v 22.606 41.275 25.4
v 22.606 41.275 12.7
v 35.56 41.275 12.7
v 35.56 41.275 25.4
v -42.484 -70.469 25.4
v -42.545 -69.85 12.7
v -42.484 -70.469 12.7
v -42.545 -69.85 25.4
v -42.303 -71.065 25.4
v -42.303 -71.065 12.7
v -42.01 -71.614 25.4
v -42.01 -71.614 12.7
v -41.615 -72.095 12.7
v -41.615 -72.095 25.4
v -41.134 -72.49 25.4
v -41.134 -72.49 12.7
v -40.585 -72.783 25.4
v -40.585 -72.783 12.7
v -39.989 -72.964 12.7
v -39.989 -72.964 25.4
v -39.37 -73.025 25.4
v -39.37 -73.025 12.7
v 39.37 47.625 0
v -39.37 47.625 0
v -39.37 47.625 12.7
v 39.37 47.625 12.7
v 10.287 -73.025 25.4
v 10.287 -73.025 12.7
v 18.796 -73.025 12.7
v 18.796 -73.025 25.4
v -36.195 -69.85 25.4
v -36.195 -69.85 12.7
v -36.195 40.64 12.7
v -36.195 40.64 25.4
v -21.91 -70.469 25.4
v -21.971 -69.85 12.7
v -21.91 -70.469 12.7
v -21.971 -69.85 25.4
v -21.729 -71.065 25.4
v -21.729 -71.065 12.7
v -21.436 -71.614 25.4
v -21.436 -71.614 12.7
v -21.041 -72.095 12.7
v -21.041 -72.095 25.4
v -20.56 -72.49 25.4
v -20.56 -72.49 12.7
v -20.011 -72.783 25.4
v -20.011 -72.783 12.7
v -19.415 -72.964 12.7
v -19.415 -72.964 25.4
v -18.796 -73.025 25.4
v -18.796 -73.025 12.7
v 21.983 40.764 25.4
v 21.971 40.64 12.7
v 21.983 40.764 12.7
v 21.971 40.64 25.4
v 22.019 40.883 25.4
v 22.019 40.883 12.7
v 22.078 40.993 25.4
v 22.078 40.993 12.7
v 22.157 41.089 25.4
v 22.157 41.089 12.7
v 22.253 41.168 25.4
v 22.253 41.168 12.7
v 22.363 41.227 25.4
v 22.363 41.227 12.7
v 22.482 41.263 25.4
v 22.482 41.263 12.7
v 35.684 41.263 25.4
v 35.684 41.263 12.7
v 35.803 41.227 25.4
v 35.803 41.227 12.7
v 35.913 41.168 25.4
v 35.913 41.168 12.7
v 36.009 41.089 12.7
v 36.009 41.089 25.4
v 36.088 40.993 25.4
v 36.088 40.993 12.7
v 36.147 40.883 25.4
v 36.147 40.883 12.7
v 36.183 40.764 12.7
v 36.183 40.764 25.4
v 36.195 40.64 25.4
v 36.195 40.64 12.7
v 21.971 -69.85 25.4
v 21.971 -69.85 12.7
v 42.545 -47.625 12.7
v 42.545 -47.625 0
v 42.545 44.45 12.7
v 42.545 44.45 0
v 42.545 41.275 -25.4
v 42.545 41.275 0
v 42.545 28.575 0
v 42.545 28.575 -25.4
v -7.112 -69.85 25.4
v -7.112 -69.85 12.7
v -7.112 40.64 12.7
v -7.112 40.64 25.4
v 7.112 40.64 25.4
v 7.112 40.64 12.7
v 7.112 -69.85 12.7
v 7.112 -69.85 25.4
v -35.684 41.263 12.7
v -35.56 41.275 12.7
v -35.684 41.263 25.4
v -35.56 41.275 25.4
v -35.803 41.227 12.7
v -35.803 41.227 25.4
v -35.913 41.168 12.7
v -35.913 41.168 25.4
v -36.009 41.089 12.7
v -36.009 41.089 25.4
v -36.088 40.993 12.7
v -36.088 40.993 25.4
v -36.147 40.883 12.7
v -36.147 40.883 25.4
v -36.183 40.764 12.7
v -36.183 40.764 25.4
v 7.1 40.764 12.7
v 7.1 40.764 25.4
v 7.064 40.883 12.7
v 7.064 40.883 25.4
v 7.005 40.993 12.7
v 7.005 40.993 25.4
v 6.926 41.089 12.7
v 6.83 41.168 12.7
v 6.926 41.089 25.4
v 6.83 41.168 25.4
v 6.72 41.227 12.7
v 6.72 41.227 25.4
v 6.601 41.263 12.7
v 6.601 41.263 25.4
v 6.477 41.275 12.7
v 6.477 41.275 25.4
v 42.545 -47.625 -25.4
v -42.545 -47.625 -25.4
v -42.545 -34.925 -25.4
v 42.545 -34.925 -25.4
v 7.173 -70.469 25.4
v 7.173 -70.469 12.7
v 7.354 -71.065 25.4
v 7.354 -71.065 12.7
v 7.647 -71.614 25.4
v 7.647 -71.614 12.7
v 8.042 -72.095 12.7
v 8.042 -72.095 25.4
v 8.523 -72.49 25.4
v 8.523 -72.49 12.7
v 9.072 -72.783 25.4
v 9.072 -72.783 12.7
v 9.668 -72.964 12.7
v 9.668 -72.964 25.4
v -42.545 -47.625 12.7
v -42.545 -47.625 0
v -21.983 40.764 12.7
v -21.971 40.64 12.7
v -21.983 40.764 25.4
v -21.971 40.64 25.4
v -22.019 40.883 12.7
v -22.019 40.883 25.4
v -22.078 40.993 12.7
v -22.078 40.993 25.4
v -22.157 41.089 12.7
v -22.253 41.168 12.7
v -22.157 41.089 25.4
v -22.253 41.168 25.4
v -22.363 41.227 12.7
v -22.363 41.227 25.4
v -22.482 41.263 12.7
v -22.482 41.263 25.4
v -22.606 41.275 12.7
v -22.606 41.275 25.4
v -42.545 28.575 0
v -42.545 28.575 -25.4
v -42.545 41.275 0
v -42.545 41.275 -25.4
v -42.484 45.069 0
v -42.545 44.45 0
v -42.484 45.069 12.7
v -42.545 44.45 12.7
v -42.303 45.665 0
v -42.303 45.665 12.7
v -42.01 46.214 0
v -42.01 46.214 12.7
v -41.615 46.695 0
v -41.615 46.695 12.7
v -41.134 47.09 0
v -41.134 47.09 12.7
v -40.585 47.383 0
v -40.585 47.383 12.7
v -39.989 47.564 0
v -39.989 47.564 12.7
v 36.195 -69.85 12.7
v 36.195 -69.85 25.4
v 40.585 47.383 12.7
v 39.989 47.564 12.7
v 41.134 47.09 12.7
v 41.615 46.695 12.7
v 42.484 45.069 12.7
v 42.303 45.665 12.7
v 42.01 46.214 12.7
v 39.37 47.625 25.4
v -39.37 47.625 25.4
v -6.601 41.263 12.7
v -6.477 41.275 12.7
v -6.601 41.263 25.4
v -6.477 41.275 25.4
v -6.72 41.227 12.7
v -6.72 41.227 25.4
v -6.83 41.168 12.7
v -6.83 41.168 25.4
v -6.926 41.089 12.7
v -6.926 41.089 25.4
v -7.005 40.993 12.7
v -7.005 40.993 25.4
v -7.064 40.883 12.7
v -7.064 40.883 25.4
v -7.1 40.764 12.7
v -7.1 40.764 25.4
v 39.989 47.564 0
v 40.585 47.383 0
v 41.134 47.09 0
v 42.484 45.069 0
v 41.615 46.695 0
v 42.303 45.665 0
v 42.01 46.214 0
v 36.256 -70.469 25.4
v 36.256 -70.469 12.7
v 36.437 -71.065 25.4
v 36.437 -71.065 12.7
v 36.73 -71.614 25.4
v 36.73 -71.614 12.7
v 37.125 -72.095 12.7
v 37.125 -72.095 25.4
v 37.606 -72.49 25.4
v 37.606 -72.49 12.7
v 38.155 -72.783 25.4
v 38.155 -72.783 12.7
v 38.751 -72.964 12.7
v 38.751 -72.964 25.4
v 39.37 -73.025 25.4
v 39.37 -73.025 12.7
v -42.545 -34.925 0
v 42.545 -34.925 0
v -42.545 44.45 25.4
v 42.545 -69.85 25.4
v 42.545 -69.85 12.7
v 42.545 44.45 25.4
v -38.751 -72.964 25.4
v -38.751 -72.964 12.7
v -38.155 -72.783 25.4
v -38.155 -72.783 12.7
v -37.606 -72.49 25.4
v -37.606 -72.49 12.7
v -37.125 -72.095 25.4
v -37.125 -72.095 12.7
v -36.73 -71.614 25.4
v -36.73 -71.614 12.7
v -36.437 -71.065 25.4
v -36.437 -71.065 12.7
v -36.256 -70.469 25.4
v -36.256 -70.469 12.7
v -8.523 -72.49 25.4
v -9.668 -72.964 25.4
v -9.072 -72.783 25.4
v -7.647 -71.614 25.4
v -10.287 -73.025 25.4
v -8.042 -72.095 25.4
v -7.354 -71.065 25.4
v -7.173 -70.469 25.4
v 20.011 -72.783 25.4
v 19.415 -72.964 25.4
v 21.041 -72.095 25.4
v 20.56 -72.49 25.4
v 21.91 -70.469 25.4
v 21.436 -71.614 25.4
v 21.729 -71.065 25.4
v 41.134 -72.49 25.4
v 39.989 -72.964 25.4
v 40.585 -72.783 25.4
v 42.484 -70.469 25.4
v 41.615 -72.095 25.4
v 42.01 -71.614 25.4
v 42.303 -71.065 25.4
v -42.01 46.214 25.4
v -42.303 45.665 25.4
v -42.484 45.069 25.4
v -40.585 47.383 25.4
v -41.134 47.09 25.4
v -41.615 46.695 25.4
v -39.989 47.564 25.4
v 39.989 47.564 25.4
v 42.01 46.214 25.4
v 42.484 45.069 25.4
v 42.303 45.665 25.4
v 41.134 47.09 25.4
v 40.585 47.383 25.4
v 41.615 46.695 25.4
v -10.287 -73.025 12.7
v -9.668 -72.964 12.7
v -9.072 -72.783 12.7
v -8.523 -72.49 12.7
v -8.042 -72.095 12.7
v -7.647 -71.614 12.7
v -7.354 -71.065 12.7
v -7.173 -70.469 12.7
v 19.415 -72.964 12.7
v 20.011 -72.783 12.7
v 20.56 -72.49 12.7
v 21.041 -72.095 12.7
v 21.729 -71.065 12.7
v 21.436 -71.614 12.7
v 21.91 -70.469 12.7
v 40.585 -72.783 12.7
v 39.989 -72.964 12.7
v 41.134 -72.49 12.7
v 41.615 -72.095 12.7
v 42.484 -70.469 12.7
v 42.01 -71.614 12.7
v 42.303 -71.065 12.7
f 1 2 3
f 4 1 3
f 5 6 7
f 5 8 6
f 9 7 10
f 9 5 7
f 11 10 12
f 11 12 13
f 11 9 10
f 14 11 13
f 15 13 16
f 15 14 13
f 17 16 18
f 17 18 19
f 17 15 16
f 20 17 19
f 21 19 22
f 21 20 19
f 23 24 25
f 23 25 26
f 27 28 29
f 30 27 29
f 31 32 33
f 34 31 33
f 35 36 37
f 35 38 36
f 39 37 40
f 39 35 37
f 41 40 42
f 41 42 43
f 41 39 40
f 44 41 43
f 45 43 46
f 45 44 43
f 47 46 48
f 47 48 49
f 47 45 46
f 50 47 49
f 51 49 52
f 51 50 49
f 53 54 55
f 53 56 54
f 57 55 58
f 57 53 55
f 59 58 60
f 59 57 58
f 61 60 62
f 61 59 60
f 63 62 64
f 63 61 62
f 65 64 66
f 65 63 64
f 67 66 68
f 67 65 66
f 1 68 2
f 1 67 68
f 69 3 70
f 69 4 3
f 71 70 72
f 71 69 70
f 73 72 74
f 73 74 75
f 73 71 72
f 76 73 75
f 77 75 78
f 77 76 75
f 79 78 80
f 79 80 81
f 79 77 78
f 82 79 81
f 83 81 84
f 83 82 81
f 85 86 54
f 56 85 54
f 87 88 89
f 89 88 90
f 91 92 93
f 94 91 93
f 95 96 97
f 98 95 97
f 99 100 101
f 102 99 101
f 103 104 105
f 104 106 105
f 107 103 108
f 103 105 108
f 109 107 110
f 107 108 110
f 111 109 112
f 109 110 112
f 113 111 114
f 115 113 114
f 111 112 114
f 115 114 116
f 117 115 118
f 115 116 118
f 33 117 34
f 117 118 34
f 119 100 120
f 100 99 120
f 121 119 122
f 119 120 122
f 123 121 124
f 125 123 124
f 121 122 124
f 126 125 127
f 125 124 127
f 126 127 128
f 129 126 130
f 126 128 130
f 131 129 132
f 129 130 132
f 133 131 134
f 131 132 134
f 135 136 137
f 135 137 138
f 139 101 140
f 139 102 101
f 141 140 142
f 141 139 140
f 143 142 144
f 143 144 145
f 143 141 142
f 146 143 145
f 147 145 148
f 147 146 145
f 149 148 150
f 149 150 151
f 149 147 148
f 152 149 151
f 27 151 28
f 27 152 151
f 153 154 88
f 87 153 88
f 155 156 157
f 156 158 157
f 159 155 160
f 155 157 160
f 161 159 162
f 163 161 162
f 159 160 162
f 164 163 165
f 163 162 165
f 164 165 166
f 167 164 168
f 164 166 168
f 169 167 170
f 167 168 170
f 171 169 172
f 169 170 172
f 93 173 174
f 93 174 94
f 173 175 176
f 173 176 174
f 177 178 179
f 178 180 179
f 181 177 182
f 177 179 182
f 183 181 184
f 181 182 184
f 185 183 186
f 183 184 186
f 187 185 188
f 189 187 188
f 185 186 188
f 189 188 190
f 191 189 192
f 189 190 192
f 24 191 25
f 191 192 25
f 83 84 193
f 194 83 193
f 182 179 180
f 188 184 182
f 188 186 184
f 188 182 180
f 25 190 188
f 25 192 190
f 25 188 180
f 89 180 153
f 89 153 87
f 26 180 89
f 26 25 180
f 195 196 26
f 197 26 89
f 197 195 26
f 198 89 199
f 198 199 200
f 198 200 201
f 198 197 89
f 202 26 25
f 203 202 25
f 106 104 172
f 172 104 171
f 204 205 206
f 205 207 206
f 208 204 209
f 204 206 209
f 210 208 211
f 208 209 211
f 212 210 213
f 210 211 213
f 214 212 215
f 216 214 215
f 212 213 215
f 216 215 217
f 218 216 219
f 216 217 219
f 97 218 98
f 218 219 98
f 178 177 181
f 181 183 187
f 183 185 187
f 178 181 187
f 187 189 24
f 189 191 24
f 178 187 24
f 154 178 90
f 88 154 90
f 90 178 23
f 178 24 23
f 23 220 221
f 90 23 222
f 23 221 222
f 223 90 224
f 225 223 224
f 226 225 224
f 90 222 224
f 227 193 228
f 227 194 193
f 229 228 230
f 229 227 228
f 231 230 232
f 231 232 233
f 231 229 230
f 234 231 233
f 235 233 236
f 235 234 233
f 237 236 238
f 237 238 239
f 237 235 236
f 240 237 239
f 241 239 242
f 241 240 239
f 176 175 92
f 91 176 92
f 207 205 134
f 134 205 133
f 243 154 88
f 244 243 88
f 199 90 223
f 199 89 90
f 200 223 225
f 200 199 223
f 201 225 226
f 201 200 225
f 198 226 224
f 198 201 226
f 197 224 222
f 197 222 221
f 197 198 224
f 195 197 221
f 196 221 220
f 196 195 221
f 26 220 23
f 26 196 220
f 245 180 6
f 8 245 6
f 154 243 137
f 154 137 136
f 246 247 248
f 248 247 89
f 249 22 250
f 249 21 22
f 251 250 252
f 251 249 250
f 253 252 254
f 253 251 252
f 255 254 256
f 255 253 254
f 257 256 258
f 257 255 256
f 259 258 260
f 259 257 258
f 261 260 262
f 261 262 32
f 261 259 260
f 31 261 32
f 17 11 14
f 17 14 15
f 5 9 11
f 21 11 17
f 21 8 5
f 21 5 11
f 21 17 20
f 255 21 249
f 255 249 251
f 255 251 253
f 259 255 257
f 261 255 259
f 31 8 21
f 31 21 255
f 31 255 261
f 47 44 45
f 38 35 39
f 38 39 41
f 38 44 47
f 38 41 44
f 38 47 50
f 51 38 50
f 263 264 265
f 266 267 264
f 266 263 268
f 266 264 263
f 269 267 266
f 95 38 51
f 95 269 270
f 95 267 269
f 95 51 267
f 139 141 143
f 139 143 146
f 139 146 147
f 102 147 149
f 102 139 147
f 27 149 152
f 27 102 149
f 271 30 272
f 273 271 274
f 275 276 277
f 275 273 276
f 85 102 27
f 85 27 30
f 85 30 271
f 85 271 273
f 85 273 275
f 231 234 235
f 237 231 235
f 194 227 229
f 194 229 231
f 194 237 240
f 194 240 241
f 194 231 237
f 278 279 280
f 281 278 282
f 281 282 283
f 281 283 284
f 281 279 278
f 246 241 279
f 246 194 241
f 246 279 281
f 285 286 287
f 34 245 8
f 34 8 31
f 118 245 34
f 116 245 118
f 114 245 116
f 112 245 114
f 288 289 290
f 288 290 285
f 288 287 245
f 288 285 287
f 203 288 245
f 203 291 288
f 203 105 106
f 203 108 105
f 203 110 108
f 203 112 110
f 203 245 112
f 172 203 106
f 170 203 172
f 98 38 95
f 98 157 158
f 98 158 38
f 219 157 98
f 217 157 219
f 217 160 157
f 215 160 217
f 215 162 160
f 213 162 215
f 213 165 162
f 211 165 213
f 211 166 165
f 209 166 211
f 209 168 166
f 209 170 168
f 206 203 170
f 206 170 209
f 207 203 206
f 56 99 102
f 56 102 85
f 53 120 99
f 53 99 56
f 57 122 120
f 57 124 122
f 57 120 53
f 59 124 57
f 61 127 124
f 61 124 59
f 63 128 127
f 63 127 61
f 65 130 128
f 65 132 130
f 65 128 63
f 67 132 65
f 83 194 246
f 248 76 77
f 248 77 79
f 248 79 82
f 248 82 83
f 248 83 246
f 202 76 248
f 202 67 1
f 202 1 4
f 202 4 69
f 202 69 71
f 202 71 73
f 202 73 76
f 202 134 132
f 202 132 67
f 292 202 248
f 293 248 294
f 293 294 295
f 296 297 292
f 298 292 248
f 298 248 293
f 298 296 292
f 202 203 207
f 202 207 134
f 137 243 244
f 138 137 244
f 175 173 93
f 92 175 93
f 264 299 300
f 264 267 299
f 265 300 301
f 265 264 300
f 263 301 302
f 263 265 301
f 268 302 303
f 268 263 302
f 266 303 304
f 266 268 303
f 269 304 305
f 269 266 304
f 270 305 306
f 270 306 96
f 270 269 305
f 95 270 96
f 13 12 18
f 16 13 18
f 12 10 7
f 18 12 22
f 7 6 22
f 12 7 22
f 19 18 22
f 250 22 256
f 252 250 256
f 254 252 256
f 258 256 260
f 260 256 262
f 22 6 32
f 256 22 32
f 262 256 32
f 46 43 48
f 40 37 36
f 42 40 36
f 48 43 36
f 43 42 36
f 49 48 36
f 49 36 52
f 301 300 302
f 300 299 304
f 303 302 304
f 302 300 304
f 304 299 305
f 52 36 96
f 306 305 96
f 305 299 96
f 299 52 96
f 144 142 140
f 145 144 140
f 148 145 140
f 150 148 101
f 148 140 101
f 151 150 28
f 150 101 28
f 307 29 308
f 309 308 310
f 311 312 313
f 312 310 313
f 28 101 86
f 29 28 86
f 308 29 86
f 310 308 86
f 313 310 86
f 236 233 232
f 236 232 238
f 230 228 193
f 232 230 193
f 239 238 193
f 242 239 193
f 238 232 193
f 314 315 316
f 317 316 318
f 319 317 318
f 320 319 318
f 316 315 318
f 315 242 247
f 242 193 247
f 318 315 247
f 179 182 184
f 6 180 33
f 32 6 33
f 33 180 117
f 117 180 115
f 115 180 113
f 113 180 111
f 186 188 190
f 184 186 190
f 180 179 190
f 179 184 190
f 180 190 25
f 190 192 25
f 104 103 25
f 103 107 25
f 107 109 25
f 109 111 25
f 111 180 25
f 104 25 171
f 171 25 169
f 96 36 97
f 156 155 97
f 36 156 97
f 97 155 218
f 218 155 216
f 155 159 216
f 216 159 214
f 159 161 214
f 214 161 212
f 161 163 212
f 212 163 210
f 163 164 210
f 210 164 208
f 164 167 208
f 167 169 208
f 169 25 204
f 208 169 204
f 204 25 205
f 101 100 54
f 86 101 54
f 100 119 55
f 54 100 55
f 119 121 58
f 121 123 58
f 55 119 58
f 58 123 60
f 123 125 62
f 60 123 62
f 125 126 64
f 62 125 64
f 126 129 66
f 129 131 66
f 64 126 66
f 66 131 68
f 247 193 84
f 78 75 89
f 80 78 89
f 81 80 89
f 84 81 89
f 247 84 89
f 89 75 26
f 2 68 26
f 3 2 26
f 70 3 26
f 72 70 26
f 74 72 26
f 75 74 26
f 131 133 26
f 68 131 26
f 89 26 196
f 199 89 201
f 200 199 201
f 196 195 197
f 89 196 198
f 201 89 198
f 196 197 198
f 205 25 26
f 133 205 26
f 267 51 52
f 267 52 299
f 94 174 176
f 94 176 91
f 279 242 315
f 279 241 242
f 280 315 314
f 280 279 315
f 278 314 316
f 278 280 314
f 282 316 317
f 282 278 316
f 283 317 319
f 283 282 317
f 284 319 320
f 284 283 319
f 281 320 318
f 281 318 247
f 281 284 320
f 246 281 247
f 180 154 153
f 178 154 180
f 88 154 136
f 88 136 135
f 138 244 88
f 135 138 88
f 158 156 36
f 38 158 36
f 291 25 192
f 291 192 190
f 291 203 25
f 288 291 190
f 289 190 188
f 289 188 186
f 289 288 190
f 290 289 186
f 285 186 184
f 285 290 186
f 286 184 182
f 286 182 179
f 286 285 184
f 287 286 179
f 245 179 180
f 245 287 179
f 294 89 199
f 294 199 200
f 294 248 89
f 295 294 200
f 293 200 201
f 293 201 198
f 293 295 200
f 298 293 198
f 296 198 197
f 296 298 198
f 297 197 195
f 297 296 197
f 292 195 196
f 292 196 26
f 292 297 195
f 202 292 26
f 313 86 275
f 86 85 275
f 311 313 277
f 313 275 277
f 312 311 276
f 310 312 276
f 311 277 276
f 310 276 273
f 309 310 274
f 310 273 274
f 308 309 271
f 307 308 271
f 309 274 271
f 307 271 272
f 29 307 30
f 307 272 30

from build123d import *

# Parameters (mm, degrees)
F0_W     = 85.09
F0_H     = 95.25
F1_DEPTH = 12.7
F3_DEPTH = 12.7
F4_W     = 85.09
F4_H     = 12.7
F5_DEPTH = 25.4
F6_R     = 3.17499
F6_2_R   = 3.17499
F7_R     = 0.635


# Not quite as in the source:
# - a fillet or chamfer is up to 0.001 mm smaller than in the source, because OpenCascade refuses the exact size


with BuildPart() as f1:
    # F0 (on Top) → F1 (new body)
    with BuildSketch(Plane.XY):
        Rectangle(F0_W, F0_H)
    extrude(amount=F1_DEPTH)

    # F6#2 (radius 3.175 in the source; OpenCascade refuses exactly that, so slightly less here)
    f6_2_edges = [f1.edges().sort_by_distance(p)[0] for p in [
        (42.545, 47.625, 6.35),
        (-42.545, 47.625, 6.35),
    ]]
    fillet(f6_2_edges, radius=F6_2_R)


with BuildPart() as f3:
    # F2 (on face) → F3 (new body)
    with BuildSketch(Plane.XY.offset(12.7)):
        Polygon((21.971, -73.025), (21.971, 41.275), (36.195, 41.275), (36.195, -73.025), (42.545, -73.025), (42.545, 47.625), (-42.545, 47.625), (-42.545, -73.025), (-36.195, -73.025), (-36.195, 41.275), (-21.971, 41.275), (-21.971, -73.025), (-7.112, -73.025), (-7.112, 41.275), (7.112, 41.275), (7.112, -73.025), align=None)
    extrude(amount=F3_DEPTH)

    # F6 (radius 3.175 in the source; OpenCascade refuses exactly that, so slightly less here)
    f6_edges = [f3.edges().sort_by_distance(p)[0] for p in [
        (-36.195, -73.025, 19.05),
        (-42.545, -73.025, 19.05),
        (-21.971, -73.025, 19.05),
        (-7.112, -73.025, 19.05),
        (7.112, -73.025, 19.05),
        (21.971, -73.025, 19.05),
        (42.545, -73.025, 19.05),
        (42.545, 47.625, 19.05),
        (-42.545, 47.625, 19.05),
        (36.195, -73.025, 19.05),
    ]]
    fillet(f6_edges, radius=F6_R)

    # F7
    f7_edges = [f3.edges().sort_by_distance(p)[0] for p in [
        (-36.195, 41.275, 19.05),
        (-7.112, 41.275, 19.05),
        (21.971, 41.275, 19.05),
        (-21.971, 41.275, 19.05),
        (7.112, 41.275, 19.05),
        (36.195, 41.275, 19.05),
    ]]
    fillet(f7_edges, radius=F7_R)


with BuildPart() as f5:
    # F4 (on face) → F5 (new body)
    with BuildSketch(Plane(origin=(0, 0, 0), x_dir=(1, 0, 0), z_dir=(0, 0, -1))):
        with Locations((0, 41.275)):
            Rectangle(F4_W, F4_H)
    extrude(amount=F5_DEPTH)


with BuildPart() as f5b:
    # F4 (on face) → F5, piece 2 (new body)
    with BuildSketch(Plane(origin=(0, 0, 0), x_dir=(1, 0, 0), z_dir=(0, 0, -1))):
        with Locations((0, -34.925)):
            Rectangle(F4_W, F4_H)
    extrude(amount=F5_DEPTH)


solid = Compound([f1.part, f3.part, f5.part, f5b.part])
